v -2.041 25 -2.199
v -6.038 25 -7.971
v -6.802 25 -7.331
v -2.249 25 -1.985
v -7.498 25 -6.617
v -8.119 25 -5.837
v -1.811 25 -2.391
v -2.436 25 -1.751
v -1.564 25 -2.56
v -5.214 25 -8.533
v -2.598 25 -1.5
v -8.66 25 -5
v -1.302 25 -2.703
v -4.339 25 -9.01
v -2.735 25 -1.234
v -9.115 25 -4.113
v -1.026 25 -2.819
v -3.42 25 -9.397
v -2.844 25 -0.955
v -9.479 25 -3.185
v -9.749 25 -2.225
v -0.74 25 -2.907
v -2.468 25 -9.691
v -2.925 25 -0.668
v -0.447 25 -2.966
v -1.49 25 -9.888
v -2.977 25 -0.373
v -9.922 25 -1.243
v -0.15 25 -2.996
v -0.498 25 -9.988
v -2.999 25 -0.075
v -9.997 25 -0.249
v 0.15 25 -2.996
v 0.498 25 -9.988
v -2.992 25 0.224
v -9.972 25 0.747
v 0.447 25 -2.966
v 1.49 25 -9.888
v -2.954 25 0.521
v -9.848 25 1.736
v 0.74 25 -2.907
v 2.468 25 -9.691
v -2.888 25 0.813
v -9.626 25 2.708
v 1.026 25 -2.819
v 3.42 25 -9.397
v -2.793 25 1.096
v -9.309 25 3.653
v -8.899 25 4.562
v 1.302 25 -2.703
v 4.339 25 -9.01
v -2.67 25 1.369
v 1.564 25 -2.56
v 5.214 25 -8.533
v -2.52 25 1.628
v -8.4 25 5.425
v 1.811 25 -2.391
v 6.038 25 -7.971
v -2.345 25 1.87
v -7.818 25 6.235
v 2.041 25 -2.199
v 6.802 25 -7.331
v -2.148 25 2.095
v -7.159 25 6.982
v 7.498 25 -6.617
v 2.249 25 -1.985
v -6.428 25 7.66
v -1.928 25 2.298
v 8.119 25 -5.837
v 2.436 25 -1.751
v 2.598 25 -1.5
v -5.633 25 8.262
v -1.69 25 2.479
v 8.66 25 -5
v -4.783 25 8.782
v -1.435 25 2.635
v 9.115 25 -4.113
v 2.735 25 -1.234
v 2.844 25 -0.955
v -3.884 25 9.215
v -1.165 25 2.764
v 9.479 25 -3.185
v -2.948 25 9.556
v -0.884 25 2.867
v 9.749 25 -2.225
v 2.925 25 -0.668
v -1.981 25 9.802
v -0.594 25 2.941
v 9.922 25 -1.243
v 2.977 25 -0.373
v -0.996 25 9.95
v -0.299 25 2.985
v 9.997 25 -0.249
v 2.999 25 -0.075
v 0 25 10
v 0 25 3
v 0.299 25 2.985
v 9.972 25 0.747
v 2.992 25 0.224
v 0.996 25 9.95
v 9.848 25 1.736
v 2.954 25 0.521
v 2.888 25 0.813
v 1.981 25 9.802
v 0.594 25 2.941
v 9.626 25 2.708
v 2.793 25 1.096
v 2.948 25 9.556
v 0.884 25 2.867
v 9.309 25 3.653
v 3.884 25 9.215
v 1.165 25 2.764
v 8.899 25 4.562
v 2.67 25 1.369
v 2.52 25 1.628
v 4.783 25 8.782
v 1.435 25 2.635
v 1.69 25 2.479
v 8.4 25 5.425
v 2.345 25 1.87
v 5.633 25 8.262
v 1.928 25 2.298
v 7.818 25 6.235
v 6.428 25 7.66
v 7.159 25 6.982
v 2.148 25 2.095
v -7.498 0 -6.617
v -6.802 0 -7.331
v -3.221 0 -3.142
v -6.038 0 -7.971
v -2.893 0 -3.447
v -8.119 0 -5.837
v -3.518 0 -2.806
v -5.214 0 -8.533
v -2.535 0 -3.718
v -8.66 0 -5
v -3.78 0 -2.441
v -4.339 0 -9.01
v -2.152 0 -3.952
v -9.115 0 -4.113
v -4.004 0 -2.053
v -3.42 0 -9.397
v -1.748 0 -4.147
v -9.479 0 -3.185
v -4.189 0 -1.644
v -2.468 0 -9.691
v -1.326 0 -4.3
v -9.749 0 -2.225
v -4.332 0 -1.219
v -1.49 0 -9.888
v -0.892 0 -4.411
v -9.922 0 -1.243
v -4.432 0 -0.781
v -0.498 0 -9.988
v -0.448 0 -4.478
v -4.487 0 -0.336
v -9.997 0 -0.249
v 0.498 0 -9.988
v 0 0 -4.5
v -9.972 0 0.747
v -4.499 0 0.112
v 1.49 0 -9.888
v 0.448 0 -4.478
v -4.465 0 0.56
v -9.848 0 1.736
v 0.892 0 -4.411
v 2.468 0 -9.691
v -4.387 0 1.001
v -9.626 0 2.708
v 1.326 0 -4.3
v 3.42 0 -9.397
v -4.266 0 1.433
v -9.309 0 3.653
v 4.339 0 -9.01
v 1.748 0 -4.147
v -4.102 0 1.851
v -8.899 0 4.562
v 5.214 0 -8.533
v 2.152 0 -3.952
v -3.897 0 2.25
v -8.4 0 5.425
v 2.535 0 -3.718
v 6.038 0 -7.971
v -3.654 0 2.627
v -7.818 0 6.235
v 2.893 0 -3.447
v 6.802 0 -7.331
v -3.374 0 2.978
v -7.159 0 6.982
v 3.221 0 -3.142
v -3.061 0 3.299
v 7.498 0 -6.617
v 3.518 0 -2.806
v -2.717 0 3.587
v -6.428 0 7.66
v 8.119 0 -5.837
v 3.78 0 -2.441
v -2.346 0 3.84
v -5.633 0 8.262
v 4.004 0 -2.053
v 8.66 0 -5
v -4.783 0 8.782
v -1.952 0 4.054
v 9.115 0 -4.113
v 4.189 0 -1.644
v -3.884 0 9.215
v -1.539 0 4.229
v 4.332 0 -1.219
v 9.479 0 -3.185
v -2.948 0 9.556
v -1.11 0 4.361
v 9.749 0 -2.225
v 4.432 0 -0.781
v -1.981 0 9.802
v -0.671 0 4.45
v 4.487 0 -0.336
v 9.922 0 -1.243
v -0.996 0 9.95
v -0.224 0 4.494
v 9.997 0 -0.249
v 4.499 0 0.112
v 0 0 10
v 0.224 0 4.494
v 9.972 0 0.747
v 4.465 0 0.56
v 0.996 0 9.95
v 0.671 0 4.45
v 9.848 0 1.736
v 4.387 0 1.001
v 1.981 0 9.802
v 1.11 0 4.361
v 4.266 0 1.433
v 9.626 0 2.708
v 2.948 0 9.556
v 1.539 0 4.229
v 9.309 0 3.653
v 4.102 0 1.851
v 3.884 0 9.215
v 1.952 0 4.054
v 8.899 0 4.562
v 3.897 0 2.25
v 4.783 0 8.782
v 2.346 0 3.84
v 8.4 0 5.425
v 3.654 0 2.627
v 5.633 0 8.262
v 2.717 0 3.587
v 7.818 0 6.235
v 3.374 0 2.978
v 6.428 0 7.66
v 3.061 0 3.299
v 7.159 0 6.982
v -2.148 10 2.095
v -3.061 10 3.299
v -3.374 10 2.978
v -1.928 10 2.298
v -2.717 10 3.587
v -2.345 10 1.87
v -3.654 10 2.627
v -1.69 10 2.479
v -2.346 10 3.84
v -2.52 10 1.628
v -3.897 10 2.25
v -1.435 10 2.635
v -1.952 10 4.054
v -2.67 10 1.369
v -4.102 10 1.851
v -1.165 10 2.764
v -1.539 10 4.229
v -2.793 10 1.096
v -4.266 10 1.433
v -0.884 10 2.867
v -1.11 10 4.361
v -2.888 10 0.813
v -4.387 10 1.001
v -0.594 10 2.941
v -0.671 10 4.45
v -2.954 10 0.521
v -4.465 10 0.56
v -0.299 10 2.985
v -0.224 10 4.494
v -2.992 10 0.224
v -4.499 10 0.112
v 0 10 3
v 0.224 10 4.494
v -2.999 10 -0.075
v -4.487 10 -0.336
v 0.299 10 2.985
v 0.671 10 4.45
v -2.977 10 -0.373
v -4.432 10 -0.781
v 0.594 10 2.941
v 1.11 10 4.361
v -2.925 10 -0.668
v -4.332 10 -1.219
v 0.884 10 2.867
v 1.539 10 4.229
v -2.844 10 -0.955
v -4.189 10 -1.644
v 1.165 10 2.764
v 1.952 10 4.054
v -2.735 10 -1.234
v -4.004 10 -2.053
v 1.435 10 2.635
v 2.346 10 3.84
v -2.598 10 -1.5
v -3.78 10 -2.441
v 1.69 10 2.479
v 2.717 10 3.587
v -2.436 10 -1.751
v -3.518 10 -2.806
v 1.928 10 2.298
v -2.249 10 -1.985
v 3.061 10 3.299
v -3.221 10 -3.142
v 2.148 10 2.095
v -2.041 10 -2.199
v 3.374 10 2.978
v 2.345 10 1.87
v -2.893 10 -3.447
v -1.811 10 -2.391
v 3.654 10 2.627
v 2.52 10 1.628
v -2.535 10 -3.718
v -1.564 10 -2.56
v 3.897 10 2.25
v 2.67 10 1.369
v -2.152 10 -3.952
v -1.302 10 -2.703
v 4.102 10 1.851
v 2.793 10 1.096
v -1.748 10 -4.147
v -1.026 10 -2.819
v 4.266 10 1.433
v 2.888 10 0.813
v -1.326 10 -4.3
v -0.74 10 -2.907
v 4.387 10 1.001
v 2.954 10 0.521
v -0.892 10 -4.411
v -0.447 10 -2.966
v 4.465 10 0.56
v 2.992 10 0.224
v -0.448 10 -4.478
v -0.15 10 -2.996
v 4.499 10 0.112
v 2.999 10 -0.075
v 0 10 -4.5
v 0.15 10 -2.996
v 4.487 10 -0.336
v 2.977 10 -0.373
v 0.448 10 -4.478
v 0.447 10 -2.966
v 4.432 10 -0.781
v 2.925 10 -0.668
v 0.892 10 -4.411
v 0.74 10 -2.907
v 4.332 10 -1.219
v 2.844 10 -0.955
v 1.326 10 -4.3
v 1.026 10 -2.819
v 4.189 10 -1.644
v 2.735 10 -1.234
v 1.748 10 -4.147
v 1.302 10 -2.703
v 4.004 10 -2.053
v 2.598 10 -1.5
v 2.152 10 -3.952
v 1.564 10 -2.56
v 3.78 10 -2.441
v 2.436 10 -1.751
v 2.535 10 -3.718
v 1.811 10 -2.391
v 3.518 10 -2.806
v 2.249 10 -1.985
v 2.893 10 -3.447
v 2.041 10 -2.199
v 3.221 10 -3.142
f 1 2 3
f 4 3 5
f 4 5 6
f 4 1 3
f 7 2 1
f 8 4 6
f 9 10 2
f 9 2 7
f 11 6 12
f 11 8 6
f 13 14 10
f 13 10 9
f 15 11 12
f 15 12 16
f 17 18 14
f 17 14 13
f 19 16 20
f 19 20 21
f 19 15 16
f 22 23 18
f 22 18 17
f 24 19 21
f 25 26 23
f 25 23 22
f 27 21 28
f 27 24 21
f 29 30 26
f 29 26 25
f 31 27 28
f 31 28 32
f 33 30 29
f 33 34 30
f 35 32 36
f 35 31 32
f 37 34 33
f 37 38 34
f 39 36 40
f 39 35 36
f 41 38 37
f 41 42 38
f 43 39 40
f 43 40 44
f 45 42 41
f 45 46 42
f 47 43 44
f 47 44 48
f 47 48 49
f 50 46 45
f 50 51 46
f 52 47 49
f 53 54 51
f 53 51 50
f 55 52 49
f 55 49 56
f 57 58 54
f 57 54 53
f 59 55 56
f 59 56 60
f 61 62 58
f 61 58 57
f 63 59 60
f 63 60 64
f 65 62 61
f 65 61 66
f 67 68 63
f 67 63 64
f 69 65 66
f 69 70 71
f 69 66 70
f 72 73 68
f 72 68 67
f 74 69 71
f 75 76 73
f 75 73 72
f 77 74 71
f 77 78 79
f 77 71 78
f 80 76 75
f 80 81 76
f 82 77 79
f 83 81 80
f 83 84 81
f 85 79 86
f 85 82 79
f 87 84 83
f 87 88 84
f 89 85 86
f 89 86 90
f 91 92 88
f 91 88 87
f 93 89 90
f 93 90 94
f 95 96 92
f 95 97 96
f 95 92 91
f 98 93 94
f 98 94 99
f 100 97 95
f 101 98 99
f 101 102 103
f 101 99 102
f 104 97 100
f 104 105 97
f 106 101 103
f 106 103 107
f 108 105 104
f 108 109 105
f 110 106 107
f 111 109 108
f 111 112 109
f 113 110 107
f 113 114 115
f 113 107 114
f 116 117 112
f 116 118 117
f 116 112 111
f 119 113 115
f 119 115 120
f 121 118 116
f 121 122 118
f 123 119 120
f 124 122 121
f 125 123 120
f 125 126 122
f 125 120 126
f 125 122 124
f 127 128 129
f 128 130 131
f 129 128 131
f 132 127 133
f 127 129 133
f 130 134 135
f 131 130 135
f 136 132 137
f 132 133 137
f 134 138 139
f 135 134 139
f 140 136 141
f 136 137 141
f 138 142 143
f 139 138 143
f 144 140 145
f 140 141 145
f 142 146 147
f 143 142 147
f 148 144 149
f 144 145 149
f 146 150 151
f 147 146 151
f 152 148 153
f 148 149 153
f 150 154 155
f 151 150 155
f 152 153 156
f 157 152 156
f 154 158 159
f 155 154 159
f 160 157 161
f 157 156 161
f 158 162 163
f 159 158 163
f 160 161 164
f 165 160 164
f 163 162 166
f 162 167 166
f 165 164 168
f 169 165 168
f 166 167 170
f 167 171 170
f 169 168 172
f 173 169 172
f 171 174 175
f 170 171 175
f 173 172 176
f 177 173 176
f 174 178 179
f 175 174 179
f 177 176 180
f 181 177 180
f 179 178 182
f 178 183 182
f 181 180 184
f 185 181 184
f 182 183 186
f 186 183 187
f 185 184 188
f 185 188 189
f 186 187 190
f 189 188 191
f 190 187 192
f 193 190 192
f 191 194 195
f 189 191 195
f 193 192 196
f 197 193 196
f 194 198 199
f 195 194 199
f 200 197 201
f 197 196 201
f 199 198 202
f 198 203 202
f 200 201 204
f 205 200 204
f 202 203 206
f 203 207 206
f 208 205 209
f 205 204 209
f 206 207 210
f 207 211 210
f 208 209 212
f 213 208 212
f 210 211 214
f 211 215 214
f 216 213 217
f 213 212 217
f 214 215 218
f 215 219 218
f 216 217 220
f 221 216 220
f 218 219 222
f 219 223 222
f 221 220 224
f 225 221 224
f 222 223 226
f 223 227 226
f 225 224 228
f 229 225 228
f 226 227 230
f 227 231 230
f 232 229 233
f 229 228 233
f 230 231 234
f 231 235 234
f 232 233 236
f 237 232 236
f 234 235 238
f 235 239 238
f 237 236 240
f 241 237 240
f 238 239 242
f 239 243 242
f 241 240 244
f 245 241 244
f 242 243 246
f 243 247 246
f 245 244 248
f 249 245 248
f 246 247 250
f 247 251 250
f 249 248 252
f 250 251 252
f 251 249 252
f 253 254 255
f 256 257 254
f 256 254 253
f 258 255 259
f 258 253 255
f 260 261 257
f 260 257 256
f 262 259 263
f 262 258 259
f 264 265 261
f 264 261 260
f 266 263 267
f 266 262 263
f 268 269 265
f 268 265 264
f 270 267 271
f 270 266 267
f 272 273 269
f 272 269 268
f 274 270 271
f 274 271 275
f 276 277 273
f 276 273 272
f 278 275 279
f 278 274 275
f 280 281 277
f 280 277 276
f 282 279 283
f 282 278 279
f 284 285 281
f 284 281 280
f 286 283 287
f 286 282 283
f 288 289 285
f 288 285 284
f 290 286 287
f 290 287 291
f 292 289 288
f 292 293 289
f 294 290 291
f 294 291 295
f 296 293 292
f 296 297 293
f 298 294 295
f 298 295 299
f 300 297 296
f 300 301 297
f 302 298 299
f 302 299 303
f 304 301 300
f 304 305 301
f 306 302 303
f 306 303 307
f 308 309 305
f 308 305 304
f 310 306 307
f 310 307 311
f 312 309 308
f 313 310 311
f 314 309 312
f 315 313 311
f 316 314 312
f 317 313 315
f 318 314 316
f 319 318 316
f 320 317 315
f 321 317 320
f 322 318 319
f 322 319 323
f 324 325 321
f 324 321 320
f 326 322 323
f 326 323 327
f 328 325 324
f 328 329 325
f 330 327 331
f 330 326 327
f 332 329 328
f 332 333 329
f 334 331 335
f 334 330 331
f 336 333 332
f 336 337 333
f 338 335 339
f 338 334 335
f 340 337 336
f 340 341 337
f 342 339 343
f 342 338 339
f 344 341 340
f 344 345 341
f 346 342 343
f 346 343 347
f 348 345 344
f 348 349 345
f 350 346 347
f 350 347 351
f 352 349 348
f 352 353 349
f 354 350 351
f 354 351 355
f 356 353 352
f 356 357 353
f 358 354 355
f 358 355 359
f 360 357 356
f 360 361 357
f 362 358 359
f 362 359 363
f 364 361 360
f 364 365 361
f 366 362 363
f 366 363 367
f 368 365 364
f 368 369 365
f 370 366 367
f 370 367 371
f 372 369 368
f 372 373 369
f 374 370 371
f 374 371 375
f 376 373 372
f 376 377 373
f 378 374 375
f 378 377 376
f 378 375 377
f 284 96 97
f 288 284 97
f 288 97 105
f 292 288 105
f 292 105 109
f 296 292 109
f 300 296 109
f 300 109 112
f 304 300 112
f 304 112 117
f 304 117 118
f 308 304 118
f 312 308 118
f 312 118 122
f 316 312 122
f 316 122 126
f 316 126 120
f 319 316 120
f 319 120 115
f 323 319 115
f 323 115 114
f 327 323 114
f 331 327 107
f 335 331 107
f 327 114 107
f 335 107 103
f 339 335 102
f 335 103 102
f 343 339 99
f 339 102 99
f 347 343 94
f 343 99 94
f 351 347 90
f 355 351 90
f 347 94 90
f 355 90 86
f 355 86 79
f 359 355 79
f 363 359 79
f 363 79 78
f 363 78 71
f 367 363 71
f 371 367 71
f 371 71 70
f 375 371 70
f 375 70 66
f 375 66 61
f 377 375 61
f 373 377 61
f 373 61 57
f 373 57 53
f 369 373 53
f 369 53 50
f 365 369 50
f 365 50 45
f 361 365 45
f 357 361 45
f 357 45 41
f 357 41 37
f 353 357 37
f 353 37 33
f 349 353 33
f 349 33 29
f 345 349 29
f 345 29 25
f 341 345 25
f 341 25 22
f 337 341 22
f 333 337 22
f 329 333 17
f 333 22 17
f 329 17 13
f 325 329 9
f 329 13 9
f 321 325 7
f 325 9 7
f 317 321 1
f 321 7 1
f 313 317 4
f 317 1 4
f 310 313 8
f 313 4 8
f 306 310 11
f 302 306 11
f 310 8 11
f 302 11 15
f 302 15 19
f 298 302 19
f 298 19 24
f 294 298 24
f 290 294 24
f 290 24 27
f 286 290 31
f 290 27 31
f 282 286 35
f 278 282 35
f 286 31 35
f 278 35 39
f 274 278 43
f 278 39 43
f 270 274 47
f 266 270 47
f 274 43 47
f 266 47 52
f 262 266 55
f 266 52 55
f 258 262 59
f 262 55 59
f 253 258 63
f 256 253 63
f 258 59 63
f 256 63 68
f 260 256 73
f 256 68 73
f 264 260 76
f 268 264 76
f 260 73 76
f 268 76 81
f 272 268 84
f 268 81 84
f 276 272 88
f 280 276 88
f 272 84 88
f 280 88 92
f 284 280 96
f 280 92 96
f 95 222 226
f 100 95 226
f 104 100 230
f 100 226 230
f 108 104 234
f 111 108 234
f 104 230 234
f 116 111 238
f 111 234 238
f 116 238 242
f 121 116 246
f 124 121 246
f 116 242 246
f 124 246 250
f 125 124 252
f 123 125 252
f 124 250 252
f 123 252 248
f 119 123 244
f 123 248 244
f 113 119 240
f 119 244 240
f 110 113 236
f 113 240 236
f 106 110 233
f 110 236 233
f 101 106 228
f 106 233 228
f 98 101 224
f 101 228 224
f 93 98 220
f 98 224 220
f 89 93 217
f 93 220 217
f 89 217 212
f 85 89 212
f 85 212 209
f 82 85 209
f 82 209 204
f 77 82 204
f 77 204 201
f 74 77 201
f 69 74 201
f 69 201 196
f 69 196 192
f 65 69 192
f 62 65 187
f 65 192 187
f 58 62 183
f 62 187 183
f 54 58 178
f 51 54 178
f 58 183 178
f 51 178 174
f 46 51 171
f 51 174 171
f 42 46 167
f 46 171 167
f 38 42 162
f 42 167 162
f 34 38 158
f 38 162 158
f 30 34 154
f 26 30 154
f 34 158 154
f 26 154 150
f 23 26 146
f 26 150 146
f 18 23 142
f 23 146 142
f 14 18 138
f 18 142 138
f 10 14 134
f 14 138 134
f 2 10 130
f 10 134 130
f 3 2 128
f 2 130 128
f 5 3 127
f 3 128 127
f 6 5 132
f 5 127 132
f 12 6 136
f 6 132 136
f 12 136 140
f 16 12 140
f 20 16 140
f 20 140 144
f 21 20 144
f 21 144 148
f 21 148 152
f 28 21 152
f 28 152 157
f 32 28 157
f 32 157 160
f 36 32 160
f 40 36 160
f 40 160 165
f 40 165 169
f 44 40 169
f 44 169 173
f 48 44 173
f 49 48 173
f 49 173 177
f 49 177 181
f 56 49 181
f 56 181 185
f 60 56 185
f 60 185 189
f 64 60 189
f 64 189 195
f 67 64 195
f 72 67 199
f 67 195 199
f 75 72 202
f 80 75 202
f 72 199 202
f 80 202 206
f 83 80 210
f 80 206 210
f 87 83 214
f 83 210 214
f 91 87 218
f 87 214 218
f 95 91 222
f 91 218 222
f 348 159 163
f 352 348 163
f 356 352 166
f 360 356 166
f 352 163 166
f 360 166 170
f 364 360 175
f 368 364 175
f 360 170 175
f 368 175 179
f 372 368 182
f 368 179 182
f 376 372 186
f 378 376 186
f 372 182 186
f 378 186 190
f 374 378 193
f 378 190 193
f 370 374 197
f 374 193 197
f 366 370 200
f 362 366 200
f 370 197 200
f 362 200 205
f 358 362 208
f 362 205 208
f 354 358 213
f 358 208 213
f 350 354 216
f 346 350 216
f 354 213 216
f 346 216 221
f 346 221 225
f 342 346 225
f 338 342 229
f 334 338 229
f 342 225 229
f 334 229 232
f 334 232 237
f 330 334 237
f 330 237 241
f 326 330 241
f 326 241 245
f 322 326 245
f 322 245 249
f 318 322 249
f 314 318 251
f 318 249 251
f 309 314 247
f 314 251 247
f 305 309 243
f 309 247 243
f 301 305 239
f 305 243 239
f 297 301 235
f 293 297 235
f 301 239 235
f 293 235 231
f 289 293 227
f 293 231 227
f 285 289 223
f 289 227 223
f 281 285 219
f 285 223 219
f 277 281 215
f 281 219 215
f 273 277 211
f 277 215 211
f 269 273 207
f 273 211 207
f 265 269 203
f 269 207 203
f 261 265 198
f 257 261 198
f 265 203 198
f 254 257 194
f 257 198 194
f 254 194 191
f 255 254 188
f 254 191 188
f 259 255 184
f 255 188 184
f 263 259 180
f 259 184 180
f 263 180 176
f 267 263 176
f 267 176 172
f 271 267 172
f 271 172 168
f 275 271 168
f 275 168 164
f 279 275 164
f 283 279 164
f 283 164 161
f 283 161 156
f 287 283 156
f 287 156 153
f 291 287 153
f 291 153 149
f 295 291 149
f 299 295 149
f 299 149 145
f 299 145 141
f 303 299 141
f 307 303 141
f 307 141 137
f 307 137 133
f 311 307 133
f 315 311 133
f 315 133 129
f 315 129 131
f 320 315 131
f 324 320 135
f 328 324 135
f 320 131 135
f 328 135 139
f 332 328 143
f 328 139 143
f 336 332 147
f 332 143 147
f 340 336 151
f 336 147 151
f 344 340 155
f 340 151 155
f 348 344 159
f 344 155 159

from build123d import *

# Parameters (mm, degrees)
SKETCH1_R           = 10
BOSS_EXTRUDE1_DEPTH = 25
SKETCH3_R           = 3
CUT_EXTRUDE1_DEPTH  = 29.722813233
SKETCH4_R           = 4.5
CUT_EXTRUDE2_DEPTH  = 10


with BuildPart() as part:
    # Sketch1 → Boss-Extrude1 (new body)
    with BuildSketch(Plane(origin=(0, 0, 0), x_dir=(1, 0, 0), z_dir=(0, 1, 0))):
        with Locations(Location((0, 0, 0), (0, 0, 270))):
            Circle(SKETCH1_R)
    extrude(amount=BOSS_EXTRUDE1_DEPTH)

    # Sketch3 → Cut-Extrude1 (cut, through all)
    with BuildSketch(Plane(origin=(0, 25, 0), x_dir=(1, 0, 0), z_dir=(0, 1, 0))):
        with Locations(Location((0, 0, 0), (0, 0, 270))):
            Circle(SKETCH3_R)
    extrude(amount=-CUT_EXTRUDE1_DEPTH, mode=Mode.SUBTRACT)

    # Sketch4 → Cut-Extrude2 (cut)
    with BuildSketch(Plane.XZ):
        with Locations(Location((0, 0, 0), (0, 0, 270))):
            Circle(SKETCH4_R)
    extrude(amount=-CUT_EXTRUDE2_DEPTH, mode=Mode.SUBTRACT)


solid = part.part
